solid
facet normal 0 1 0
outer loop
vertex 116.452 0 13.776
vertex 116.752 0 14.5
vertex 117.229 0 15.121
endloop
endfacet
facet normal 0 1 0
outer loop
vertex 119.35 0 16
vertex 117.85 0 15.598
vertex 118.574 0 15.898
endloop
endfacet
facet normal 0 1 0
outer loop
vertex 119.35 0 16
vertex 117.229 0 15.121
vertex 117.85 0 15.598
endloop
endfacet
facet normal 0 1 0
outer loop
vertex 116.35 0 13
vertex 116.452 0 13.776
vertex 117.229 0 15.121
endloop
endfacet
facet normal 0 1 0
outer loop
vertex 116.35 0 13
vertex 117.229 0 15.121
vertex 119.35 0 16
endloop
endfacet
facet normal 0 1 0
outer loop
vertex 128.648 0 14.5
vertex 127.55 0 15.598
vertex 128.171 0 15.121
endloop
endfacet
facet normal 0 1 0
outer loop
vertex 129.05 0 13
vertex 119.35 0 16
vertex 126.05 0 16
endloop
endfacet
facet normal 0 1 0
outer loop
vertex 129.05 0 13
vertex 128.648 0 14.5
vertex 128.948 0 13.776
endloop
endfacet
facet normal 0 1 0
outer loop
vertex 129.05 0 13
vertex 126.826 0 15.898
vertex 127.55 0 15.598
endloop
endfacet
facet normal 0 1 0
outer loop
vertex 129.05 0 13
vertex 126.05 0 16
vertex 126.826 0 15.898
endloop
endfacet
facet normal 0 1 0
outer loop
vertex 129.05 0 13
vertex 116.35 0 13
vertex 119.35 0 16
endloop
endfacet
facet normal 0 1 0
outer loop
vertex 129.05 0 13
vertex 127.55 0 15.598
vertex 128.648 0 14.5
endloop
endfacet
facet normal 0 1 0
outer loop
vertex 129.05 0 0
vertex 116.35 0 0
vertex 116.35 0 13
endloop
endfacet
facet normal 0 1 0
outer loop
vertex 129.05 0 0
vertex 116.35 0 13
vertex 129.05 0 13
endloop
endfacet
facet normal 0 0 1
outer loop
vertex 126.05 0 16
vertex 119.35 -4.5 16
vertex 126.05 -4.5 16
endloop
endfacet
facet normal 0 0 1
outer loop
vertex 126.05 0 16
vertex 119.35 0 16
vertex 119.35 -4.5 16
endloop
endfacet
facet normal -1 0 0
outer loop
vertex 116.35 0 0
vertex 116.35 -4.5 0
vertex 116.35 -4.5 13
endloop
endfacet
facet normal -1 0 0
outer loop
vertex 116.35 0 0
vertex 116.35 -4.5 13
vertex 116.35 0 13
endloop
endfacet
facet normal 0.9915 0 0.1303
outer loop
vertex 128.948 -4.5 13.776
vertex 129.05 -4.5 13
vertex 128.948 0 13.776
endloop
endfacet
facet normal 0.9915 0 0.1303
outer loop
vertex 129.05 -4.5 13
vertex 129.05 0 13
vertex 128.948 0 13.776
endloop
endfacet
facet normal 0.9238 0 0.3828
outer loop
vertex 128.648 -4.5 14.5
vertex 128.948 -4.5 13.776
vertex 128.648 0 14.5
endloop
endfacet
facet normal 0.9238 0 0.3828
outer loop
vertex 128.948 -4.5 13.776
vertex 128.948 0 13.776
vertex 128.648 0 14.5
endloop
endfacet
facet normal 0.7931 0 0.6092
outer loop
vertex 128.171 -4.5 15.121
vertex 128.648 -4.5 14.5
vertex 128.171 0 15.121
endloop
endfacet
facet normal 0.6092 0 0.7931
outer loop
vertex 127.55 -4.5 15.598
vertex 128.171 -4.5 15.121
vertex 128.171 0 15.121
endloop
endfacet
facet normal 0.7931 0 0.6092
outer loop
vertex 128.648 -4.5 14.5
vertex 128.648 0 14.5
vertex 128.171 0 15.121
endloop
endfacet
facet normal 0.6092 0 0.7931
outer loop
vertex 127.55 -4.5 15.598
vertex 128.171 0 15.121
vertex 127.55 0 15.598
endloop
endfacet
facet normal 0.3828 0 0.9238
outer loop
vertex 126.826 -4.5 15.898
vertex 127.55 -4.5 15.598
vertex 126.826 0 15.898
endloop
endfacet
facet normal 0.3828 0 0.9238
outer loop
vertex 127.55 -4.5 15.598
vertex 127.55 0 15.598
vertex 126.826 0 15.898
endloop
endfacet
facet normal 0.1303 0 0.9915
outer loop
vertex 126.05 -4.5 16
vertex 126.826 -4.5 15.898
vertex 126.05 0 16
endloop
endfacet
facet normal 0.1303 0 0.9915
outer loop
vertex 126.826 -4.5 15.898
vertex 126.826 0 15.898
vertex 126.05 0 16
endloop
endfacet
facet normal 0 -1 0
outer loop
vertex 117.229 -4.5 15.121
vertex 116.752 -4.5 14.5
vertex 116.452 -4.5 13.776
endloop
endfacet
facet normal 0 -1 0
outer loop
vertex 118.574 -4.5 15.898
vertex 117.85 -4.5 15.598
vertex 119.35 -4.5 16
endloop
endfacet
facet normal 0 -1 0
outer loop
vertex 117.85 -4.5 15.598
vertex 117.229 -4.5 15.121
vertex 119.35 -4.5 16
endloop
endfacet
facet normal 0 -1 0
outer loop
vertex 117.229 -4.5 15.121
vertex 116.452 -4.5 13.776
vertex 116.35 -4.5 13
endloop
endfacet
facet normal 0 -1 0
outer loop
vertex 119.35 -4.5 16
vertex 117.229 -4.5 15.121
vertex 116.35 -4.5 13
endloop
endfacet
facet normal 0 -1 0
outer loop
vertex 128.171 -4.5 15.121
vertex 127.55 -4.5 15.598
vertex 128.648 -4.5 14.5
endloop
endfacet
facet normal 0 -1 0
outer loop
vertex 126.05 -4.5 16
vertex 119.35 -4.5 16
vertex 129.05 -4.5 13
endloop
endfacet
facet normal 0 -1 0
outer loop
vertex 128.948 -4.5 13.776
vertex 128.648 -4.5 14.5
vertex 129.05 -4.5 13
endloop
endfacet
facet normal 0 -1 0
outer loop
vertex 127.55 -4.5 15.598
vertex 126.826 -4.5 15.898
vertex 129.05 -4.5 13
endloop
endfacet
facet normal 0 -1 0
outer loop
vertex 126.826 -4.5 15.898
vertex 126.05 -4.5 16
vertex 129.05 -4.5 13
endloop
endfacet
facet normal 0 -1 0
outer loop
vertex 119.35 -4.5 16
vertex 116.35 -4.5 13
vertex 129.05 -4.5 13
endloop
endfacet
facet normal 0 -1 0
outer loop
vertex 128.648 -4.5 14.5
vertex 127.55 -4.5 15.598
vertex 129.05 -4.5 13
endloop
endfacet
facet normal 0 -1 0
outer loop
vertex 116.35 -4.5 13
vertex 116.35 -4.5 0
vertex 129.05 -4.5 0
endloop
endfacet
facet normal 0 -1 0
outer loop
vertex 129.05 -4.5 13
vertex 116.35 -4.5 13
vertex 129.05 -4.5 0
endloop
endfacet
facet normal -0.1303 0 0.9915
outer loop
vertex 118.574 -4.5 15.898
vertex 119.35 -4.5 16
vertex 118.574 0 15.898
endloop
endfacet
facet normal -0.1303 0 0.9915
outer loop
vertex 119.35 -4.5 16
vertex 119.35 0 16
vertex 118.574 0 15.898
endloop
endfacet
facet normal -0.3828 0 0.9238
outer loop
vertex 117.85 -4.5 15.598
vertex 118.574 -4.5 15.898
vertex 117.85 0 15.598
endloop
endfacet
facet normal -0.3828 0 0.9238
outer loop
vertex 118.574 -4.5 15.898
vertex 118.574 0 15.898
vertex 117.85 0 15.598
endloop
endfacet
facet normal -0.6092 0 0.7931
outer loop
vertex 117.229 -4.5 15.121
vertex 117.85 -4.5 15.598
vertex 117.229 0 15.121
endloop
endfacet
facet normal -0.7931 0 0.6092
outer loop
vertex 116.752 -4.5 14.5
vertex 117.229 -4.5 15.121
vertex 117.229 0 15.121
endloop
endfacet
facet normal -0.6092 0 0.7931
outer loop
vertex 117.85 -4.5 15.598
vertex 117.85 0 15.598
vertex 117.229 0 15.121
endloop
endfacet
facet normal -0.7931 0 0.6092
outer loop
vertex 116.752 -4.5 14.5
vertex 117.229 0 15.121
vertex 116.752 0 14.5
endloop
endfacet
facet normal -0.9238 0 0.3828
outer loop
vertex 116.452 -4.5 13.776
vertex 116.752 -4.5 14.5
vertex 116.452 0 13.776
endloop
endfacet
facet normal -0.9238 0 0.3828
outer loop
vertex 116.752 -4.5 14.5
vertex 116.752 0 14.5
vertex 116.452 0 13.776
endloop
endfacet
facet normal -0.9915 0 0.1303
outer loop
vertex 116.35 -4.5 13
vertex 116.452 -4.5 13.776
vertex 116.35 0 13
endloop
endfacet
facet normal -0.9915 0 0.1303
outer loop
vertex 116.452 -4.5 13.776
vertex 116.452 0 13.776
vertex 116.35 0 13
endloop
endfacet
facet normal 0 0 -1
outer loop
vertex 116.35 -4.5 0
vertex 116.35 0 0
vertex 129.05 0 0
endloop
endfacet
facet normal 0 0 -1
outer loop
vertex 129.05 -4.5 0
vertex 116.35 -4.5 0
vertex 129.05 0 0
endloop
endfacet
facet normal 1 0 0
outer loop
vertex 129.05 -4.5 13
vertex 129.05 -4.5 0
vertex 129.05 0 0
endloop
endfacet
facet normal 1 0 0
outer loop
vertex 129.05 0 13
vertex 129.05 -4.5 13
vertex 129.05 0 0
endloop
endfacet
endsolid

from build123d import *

# Parameters (mm, degrees)
SKETCH1_W           = 12.7
SKETCH1_H           = 4.5
BOSS_EXTRUDE1_DEPTH = 16
FILLET1_R           = 3
FILLET2_R           = 3


with BuildPart() as part:
    # Sketch1 → Boss-Extrude1 (new body)
    with BuildSketch(Plane.XY):
        with Locations((122.7, -2.25)):
            Rectangle(SKETCH1_W, SKETCH1_H)
    extrude(amount=BOSS_EXTRUDE1_DEPTH)

    # Fillet1
    fillet1_edges = [part.edges().sort_by_distance(p)[0] for p in [
        (129.05, -2.25, 16),
    ]]
    fillet(fillet1_edges, radius=FILLET1_R)

    # Fillet2
    fillet2_edges = [part.edges().sort_by_distance(p)[0] for p in [
        (116.35, -2.25, 16),
    ]]
    fillet(fillet2_edges, radius=FILLET2_R)


solid = part.part
